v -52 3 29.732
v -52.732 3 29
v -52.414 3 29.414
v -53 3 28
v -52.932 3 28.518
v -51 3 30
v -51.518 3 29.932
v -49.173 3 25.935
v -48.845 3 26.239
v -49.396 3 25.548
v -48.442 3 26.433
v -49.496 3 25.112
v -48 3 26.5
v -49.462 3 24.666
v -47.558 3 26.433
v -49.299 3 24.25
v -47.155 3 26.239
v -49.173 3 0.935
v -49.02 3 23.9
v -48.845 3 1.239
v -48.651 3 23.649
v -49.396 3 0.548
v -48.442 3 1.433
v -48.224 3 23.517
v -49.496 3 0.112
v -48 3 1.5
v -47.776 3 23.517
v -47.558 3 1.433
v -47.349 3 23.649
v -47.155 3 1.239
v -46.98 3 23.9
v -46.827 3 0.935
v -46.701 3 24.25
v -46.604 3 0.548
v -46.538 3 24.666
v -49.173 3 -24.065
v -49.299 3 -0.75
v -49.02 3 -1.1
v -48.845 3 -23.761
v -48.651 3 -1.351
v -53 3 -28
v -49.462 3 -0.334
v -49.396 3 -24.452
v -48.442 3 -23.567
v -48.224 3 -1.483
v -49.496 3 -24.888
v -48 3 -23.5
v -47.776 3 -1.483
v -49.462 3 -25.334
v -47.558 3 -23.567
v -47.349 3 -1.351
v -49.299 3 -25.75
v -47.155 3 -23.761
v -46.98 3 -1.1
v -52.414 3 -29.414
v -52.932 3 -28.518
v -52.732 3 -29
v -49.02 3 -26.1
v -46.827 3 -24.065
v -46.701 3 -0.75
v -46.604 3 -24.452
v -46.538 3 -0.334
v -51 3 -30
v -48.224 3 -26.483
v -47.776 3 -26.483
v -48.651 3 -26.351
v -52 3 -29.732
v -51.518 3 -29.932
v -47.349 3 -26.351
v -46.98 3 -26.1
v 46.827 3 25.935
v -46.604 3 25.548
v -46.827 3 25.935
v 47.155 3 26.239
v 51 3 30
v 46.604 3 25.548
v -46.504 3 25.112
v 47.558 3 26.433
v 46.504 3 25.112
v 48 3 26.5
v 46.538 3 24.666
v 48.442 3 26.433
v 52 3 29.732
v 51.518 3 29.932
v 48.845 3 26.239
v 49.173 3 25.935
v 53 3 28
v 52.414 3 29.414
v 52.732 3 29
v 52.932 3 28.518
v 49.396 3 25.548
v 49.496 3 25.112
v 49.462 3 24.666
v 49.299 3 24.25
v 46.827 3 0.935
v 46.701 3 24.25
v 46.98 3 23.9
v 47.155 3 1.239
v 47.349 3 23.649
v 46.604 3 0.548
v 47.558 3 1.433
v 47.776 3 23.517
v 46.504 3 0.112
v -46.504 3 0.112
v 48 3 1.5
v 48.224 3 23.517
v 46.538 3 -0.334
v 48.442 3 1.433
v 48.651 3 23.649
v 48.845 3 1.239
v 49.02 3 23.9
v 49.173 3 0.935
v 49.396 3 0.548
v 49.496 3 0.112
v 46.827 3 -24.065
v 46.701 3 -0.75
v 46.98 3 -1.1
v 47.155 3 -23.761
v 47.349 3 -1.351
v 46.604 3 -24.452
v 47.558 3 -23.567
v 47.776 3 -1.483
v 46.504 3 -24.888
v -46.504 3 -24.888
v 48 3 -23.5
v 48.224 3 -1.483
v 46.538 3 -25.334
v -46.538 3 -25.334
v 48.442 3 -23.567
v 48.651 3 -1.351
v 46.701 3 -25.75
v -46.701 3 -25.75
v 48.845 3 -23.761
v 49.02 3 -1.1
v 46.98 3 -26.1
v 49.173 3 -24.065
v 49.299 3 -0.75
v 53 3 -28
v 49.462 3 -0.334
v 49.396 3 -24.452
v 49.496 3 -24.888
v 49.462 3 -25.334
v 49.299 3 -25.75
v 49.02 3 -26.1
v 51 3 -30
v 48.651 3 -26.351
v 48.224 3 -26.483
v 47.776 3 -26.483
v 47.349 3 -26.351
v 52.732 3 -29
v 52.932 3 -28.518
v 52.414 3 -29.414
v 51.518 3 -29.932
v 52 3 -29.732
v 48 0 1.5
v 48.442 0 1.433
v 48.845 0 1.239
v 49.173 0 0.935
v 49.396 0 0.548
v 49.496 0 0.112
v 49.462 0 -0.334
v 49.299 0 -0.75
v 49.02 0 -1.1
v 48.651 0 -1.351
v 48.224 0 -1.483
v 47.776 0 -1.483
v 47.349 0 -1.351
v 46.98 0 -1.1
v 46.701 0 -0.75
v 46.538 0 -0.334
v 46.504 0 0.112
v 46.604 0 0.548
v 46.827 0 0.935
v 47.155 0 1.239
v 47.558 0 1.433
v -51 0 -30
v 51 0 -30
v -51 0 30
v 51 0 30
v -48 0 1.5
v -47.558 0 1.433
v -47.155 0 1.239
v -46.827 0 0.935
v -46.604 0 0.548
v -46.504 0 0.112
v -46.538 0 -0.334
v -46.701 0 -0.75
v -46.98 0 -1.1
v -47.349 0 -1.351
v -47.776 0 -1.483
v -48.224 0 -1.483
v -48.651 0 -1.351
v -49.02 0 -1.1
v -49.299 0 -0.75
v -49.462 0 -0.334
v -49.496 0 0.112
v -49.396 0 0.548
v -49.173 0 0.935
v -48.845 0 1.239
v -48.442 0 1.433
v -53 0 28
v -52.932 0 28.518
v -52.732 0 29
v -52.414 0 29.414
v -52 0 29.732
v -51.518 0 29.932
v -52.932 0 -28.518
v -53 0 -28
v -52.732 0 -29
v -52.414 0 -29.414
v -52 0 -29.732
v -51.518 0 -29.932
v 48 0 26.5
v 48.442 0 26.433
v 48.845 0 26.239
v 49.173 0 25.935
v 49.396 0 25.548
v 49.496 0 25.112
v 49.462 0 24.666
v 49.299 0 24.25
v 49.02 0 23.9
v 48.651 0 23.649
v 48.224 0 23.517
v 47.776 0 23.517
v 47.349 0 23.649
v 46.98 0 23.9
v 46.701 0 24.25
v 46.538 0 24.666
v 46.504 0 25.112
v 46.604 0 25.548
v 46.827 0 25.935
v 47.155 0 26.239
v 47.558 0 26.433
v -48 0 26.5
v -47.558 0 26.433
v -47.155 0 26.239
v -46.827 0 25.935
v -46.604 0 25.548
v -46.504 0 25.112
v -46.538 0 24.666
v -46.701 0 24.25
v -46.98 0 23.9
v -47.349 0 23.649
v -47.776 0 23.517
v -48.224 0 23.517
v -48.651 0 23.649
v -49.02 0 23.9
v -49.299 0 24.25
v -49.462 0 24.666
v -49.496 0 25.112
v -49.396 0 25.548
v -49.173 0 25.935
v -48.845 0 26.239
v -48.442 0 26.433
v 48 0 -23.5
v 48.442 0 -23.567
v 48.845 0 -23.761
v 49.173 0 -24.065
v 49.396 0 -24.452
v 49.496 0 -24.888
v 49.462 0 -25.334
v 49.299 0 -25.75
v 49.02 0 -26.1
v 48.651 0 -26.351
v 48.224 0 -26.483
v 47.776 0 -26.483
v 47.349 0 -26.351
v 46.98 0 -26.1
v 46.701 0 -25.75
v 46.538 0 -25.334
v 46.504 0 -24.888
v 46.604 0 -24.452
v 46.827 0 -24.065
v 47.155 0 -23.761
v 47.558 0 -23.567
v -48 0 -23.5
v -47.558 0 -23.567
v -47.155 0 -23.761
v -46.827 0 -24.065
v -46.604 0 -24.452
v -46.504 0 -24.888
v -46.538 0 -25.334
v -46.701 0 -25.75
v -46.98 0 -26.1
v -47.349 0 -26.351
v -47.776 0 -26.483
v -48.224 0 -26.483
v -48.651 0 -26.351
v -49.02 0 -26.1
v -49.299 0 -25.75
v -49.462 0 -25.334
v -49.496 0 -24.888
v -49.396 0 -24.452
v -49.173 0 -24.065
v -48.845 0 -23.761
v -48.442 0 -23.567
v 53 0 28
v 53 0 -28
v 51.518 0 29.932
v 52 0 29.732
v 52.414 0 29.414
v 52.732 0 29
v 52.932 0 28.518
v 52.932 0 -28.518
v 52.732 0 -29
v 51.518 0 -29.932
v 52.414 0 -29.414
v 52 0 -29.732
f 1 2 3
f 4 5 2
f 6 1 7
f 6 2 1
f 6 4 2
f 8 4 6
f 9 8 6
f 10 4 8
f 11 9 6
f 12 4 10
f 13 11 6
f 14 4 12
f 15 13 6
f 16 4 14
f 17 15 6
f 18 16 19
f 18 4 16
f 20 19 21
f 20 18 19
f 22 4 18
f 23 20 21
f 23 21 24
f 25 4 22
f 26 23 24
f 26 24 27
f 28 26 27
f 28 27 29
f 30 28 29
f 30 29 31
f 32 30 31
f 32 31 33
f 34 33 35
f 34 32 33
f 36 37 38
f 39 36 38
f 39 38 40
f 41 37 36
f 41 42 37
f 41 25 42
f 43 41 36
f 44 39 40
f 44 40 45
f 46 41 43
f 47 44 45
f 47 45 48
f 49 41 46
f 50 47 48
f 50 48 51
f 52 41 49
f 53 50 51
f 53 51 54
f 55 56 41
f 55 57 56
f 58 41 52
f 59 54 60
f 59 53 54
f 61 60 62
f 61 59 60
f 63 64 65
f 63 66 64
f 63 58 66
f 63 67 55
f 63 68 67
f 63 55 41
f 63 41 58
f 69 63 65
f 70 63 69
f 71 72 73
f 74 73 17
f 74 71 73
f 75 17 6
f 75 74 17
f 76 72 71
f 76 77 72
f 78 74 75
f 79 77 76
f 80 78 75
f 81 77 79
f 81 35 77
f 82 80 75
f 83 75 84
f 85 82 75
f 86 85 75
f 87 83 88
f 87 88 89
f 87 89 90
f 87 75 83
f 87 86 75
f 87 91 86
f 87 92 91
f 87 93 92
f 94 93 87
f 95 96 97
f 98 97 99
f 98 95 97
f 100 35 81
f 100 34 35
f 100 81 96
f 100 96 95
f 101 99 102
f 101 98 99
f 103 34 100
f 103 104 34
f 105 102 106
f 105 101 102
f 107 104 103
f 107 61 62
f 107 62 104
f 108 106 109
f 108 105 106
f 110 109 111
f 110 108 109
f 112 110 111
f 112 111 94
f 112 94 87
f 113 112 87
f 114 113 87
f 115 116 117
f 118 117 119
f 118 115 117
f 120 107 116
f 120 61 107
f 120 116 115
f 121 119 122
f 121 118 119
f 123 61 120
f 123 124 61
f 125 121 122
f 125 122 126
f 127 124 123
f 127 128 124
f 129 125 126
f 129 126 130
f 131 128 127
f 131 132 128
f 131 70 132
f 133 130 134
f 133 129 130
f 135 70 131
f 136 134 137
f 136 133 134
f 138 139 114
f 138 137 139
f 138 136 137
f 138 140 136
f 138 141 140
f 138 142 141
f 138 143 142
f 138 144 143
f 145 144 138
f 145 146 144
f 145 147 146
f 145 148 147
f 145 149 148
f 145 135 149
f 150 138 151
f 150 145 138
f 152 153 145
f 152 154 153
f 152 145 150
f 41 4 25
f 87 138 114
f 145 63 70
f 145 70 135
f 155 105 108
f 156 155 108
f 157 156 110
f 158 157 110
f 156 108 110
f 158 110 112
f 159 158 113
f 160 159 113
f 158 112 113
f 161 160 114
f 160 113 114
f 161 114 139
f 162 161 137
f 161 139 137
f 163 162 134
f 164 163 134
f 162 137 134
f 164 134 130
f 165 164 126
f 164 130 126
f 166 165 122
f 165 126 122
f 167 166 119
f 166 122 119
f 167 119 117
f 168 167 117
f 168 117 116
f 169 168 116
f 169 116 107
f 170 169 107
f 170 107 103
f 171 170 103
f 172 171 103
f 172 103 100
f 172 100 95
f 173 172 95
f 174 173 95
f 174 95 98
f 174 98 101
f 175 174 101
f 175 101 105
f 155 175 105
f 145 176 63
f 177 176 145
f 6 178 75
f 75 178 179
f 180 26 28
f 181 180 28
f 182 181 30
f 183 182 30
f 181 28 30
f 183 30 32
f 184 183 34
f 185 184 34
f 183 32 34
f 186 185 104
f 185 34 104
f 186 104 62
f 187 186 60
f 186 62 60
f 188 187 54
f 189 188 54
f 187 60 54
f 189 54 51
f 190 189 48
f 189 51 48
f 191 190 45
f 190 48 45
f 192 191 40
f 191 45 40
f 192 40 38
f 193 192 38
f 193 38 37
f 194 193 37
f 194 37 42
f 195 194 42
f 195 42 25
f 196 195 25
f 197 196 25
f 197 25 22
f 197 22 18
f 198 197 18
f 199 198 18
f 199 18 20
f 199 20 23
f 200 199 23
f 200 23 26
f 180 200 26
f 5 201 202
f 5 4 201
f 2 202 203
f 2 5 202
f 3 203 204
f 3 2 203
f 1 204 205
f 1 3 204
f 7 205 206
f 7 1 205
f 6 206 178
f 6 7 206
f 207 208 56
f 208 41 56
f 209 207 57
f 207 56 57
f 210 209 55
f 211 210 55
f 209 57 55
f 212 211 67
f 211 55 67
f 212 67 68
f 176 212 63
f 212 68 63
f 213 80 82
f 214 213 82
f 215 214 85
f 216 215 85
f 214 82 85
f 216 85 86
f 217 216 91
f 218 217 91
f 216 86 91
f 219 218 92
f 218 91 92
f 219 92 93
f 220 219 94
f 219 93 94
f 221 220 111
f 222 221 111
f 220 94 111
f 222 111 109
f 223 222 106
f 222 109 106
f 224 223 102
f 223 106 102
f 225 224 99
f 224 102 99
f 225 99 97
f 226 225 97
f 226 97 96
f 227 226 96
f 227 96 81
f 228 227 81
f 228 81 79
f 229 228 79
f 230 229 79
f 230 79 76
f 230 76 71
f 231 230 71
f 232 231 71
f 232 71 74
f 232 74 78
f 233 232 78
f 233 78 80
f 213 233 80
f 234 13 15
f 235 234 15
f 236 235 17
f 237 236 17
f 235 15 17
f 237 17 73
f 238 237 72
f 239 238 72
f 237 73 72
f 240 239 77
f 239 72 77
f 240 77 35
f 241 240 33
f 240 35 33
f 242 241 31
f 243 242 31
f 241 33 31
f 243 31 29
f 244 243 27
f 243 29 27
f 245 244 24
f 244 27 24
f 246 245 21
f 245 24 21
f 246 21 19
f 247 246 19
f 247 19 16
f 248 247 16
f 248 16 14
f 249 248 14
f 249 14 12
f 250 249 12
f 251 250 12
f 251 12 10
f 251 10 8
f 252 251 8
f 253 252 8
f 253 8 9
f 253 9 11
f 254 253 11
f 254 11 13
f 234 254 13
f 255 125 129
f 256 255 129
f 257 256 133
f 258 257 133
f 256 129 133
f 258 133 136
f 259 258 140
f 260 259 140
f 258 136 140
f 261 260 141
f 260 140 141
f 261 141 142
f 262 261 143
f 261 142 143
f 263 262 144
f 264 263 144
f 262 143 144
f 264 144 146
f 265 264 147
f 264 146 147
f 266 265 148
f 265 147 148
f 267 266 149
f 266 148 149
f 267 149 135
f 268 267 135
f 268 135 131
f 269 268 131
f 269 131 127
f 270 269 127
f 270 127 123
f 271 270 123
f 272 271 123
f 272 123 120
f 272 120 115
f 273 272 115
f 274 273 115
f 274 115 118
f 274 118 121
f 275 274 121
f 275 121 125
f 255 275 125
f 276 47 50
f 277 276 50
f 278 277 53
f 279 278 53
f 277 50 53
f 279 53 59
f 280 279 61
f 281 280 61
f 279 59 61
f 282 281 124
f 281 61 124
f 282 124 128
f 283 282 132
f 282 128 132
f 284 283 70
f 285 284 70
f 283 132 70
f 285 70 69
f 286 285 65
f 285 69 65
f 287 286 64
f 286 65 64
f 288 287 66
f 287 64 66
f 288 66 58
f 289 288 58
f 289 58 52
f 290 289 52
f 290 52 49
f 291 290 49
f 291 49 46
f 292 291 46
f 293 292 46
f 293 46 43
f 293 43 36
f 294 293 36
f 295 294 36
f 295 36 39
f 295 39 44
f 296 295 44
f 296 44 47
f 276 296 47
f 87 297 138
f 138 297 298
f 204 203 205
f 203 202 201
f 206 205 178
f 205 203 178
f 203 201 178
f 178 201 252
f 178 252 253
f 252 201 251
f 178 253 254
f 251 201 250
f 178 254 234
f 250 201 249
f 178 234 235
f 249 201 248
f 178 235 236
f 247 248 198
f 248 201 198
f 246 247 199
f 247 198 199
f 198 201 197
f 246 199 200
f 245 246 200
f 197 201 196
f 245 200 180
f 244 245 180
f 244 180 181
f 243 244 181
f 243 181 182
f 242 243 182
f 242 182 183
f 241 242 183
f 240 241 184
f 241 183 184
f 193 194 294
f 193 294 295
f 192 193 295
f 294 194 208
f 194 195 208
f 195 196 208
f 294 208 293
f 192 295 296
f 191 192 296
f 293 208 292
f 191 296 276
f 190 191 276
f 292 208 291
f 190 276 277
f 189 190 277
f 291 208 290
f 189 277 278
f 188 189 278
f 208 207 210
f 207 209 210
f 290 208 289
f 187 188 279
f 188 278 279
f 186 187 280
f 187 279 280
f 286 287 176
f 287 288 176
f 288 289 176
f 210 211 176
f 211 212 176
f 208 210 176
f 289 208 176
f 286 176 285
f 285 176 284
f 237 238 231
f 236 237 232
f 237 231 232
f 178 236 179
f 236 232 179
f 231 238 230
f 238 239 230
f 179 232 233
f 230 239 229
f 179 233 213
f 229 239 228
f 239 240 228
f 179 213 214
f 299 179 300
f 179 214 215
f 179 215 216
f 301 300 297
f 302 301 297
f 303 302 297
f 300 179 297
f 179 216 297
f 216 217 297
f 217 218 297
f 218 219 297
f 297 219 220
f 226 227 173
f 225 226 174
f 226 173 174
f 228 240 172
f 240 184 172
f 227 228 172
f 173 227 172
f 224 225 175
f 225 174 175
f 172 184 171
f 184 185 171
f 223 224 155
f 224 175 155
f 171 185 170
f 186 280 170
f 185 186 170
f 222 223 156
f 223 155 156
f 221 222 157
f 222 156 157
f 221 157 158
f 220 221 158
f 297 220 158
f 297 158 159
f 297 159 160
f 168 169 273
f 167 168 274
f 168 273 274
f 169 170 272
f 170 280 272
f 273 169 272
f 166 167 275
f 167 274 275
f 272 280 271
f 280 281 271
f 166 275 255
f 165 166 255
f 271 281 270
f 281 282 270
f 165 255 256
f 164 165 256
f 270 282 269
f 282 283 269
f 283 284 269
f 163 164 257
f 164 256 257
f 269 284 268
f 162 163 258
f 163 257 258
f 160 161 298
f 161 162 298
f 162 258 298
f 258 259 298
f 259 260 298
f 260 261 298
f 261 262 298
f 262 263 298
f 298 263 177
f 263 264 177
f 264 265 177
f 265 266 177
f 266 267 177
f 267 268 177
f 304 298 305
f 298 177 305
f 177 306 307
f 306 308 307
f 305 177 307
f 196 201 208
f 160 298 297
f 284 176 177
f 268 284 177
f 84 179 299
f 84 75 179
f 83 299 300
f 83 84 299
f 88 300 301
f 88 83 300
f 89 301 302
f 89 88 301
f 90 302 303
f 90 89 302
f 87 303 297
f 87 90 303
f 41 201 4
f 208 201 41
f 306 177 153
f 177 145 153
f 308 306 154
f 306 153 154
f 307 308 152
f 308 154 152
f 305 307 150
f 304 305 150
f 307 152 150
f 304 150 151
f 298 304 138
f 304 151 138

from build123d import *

# Parameters (mm, degrees)
SKETCH_1_W          = 106
SKETCH_1_H          = 60
EXTRUDE_1_DEPTH     = 3
SKETCH_2_R          = 1.5
CUT_EXTRUDE_1_DEPTH = 10
FILLET_1_R          = 2


with BuildPart() as part:
    # 草图1 → 凸台-拉伸1 (new body)
    with BuildSketch(Plane(origin=(0, 0, 0), x_dir=(1, 0, 0), z_dir=(0, 1, 0))):
        Rectangle(SKETCH_1_W, SKETCH_1_H)
    extrude(amount=EXTRUDE_1_DEPTH)

    # 草图2 → 切除-拉伸1 (cut)
    with BuildSketch(Plane(origin=(0, 3, 0), x_dir=(1, 0, 0), z_dir=(0, 1, 0))):
        with Locations(Location((-48, 25, 0), (0, 0, 270))):
            Circle(SKETCH_2_R)
        with Locations(Location((-48, 0, 0), (0, 0, 270))):
            Circle(SKETCH_2_R)
        with Locations(Location((-48, -25, 0), (0, 0, 270))):
            Circle(SKETCH_2_R)
        with Locations(Location((48, -25, 0), (0, 0, 270))):
            Circle(SKETCH_2_R)
        with Locations(Location((48, 0, 0), (0, 0, 270))):
            Circle(SKETCH_2_R)
        with Locations(Location((48, 25, 0), (0, 0, 270))):
            Circle(SKETCH_2_R)
    extrude(amount=-CUT_EXTRUDE_1_DEPTH, mode=Mode.SUBTRACT)

    # 圆角1
    fillet_1_edges = [part.edges().sort_by_distance(p)[0] for p in [
        (53, 1.5, 30),
        (-53, 1.5, 30),
        (-53, 1.5, -30),
        (53, 1.5, -30),
    ]]
    fillet(fillet_1_edges, radius=FILLET_1_R)


solid = part.part
